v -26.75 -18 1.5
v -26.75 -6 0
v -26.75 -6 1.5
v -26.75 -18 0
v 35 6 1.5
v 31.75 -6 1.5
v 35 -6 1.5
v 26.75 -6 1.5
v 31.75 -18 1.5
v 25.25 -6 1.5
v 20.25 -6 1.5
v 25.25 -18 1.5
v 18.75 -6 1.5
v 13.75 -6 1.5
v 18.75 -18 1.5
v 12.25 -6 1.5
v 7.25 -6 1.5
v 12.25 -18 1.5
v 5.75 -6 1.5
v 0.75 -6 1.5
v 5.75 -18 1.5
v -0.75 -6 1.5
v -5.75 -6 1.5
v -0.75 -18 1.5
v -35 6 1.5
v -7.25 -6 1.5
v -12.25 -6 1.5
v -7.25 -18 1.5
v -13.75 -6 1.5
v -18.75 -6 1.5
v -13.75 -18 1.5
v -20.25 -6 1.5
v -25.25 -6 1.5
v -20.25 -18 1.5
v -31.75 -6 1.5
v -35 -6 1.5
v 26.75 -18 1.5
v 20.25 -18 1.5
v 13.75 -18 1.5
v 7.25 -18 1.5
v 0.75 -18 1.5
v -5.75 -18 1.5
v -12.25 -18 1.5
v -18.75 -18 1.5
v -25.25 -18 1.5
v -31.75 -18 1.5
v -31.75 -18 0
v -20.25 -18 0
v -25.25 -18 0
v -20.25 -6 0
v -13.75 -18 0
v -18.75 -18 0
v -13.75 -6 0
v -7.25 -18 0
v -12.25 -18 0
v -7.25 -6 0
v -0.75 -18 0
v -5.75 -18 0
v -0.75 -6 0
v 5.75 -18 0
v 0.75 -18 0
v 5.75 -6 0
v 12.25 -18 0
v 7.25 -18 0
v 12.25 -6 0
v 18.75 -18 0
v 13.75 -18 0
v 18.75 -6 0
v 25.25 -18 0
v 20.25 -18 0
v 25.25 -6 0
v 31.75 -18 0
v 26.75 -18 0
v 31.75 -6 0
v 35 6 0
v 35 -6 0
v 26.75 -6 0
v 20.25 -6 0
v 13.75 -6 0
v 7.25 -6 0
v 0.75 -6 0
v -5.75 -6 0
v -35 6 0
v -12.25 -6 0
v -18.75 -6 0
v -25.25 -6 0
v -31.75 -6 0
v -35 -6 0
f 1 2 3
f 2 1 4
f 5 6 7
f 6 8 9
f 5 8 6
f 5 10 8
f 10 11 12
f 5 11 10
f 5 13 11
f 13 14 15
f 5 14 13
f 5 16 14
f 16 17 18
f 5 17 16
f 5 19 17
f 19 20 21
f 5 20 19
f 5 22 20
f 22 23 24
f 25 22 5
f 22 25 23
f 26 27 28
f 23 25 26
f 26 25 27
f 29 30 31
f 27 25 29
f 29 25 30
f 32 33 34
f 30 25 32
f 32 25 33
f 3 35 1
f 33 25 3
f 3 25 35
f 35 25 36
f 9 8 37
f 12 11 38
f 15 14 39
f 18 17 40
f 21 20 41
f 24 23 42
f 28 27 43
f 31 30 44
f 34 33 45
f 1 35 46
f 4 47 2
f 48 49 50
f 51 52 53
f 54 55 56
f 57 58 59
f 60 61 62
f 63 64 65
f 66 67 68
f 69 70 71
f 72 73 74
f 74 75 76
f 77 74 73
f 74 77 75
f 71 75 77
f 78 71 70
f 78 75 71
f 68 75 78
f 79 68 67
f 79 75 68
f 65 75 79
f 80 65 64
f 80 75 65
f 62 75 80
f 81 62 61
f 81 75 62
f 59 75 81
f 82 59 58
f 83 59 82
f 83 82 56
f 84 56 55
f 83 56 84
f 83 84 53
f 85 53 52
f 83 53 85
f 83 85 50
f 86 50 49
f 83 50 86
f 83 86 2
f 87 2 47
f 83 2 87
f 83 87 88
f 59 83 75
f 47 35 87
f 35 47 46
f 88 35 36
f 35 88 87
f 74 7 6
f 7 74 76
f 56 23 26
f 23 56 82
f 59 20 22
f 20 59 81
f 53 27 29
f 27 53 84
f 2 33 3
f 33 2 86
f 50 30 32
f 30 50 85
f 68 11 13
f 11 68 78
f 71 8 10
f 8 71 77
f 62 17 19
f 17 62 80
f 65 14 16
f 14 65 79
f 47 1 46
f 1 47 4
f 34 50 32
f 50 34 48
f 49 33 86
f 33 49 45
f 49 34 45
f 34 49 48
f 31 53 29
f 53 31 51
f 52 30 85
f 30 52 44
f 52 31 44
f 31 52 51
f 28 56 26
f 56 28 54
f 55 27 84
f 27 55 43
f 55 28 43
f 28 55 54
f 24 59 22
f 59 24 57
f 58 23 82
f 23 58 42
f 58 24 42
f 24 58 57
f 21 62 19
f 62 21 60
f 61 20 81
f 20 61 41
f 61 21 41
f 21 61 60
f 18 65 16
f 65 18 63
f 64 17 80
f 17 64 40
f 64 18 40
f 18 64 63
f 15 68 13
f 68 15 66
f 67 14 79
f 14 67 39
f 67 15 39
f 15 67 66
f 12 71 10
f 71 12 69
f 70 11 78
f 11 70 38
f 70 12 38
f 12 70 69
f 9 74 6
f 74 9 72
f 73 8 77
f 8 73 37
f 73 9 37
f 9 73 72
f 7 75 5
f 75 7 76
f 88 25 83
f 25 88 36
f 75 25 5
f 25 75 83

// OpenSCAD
// 10-well agarose gel comb - flat plate with spine and hanging teeth.
// Orientation: Lying flat on XY plane, spine along X, teeth hanging in -Y.

// Dimensions
spine_len = 70;
spine_w   = 12;
plate_thk = 1.5;

tooth_w   = 5.0;
tooth_l   = 12;
tooth_gap = 1.5;
num_teeth = 10;

$fn = 64;

// Calculate total width of the tooth row
tooth_row_w = (num_teeth * tooth_w) + ((num_teeth - 1) * tooth_gap);

// Calculate the starting X position for the row to center it on the spine
// Spine center is at 0. Tooth row center must be at 0.
// Left edge of the row = -tooth_row_w / 2
row_start_x = -tooth_row_w / 2;

// Step size for X positions (tooth width + gap)
step_x = tooth_w + tooth_gap;

// Build the spine
translate([-spine_len / 2, -spine_w / 2, 0])
    cube([spine_len, spine_w, plate_thk]);

// Build the teeth
for (i = [0 : num_teeth - 1]) {
    // Calculate X position for this tooth
    tooth_x = row_start_x + i * step_x;
    
    // Teeth hang from the -Y edge of the spine
    // Spine bottom edge is at y = -spine_w / 2
    // Teeth extend from there down by tooth_l
    translate([tooth_x, -spine_w / 2 - tooth_l, 0])
        cube([tooth_w, tooth_l, plate_thk]);
}
